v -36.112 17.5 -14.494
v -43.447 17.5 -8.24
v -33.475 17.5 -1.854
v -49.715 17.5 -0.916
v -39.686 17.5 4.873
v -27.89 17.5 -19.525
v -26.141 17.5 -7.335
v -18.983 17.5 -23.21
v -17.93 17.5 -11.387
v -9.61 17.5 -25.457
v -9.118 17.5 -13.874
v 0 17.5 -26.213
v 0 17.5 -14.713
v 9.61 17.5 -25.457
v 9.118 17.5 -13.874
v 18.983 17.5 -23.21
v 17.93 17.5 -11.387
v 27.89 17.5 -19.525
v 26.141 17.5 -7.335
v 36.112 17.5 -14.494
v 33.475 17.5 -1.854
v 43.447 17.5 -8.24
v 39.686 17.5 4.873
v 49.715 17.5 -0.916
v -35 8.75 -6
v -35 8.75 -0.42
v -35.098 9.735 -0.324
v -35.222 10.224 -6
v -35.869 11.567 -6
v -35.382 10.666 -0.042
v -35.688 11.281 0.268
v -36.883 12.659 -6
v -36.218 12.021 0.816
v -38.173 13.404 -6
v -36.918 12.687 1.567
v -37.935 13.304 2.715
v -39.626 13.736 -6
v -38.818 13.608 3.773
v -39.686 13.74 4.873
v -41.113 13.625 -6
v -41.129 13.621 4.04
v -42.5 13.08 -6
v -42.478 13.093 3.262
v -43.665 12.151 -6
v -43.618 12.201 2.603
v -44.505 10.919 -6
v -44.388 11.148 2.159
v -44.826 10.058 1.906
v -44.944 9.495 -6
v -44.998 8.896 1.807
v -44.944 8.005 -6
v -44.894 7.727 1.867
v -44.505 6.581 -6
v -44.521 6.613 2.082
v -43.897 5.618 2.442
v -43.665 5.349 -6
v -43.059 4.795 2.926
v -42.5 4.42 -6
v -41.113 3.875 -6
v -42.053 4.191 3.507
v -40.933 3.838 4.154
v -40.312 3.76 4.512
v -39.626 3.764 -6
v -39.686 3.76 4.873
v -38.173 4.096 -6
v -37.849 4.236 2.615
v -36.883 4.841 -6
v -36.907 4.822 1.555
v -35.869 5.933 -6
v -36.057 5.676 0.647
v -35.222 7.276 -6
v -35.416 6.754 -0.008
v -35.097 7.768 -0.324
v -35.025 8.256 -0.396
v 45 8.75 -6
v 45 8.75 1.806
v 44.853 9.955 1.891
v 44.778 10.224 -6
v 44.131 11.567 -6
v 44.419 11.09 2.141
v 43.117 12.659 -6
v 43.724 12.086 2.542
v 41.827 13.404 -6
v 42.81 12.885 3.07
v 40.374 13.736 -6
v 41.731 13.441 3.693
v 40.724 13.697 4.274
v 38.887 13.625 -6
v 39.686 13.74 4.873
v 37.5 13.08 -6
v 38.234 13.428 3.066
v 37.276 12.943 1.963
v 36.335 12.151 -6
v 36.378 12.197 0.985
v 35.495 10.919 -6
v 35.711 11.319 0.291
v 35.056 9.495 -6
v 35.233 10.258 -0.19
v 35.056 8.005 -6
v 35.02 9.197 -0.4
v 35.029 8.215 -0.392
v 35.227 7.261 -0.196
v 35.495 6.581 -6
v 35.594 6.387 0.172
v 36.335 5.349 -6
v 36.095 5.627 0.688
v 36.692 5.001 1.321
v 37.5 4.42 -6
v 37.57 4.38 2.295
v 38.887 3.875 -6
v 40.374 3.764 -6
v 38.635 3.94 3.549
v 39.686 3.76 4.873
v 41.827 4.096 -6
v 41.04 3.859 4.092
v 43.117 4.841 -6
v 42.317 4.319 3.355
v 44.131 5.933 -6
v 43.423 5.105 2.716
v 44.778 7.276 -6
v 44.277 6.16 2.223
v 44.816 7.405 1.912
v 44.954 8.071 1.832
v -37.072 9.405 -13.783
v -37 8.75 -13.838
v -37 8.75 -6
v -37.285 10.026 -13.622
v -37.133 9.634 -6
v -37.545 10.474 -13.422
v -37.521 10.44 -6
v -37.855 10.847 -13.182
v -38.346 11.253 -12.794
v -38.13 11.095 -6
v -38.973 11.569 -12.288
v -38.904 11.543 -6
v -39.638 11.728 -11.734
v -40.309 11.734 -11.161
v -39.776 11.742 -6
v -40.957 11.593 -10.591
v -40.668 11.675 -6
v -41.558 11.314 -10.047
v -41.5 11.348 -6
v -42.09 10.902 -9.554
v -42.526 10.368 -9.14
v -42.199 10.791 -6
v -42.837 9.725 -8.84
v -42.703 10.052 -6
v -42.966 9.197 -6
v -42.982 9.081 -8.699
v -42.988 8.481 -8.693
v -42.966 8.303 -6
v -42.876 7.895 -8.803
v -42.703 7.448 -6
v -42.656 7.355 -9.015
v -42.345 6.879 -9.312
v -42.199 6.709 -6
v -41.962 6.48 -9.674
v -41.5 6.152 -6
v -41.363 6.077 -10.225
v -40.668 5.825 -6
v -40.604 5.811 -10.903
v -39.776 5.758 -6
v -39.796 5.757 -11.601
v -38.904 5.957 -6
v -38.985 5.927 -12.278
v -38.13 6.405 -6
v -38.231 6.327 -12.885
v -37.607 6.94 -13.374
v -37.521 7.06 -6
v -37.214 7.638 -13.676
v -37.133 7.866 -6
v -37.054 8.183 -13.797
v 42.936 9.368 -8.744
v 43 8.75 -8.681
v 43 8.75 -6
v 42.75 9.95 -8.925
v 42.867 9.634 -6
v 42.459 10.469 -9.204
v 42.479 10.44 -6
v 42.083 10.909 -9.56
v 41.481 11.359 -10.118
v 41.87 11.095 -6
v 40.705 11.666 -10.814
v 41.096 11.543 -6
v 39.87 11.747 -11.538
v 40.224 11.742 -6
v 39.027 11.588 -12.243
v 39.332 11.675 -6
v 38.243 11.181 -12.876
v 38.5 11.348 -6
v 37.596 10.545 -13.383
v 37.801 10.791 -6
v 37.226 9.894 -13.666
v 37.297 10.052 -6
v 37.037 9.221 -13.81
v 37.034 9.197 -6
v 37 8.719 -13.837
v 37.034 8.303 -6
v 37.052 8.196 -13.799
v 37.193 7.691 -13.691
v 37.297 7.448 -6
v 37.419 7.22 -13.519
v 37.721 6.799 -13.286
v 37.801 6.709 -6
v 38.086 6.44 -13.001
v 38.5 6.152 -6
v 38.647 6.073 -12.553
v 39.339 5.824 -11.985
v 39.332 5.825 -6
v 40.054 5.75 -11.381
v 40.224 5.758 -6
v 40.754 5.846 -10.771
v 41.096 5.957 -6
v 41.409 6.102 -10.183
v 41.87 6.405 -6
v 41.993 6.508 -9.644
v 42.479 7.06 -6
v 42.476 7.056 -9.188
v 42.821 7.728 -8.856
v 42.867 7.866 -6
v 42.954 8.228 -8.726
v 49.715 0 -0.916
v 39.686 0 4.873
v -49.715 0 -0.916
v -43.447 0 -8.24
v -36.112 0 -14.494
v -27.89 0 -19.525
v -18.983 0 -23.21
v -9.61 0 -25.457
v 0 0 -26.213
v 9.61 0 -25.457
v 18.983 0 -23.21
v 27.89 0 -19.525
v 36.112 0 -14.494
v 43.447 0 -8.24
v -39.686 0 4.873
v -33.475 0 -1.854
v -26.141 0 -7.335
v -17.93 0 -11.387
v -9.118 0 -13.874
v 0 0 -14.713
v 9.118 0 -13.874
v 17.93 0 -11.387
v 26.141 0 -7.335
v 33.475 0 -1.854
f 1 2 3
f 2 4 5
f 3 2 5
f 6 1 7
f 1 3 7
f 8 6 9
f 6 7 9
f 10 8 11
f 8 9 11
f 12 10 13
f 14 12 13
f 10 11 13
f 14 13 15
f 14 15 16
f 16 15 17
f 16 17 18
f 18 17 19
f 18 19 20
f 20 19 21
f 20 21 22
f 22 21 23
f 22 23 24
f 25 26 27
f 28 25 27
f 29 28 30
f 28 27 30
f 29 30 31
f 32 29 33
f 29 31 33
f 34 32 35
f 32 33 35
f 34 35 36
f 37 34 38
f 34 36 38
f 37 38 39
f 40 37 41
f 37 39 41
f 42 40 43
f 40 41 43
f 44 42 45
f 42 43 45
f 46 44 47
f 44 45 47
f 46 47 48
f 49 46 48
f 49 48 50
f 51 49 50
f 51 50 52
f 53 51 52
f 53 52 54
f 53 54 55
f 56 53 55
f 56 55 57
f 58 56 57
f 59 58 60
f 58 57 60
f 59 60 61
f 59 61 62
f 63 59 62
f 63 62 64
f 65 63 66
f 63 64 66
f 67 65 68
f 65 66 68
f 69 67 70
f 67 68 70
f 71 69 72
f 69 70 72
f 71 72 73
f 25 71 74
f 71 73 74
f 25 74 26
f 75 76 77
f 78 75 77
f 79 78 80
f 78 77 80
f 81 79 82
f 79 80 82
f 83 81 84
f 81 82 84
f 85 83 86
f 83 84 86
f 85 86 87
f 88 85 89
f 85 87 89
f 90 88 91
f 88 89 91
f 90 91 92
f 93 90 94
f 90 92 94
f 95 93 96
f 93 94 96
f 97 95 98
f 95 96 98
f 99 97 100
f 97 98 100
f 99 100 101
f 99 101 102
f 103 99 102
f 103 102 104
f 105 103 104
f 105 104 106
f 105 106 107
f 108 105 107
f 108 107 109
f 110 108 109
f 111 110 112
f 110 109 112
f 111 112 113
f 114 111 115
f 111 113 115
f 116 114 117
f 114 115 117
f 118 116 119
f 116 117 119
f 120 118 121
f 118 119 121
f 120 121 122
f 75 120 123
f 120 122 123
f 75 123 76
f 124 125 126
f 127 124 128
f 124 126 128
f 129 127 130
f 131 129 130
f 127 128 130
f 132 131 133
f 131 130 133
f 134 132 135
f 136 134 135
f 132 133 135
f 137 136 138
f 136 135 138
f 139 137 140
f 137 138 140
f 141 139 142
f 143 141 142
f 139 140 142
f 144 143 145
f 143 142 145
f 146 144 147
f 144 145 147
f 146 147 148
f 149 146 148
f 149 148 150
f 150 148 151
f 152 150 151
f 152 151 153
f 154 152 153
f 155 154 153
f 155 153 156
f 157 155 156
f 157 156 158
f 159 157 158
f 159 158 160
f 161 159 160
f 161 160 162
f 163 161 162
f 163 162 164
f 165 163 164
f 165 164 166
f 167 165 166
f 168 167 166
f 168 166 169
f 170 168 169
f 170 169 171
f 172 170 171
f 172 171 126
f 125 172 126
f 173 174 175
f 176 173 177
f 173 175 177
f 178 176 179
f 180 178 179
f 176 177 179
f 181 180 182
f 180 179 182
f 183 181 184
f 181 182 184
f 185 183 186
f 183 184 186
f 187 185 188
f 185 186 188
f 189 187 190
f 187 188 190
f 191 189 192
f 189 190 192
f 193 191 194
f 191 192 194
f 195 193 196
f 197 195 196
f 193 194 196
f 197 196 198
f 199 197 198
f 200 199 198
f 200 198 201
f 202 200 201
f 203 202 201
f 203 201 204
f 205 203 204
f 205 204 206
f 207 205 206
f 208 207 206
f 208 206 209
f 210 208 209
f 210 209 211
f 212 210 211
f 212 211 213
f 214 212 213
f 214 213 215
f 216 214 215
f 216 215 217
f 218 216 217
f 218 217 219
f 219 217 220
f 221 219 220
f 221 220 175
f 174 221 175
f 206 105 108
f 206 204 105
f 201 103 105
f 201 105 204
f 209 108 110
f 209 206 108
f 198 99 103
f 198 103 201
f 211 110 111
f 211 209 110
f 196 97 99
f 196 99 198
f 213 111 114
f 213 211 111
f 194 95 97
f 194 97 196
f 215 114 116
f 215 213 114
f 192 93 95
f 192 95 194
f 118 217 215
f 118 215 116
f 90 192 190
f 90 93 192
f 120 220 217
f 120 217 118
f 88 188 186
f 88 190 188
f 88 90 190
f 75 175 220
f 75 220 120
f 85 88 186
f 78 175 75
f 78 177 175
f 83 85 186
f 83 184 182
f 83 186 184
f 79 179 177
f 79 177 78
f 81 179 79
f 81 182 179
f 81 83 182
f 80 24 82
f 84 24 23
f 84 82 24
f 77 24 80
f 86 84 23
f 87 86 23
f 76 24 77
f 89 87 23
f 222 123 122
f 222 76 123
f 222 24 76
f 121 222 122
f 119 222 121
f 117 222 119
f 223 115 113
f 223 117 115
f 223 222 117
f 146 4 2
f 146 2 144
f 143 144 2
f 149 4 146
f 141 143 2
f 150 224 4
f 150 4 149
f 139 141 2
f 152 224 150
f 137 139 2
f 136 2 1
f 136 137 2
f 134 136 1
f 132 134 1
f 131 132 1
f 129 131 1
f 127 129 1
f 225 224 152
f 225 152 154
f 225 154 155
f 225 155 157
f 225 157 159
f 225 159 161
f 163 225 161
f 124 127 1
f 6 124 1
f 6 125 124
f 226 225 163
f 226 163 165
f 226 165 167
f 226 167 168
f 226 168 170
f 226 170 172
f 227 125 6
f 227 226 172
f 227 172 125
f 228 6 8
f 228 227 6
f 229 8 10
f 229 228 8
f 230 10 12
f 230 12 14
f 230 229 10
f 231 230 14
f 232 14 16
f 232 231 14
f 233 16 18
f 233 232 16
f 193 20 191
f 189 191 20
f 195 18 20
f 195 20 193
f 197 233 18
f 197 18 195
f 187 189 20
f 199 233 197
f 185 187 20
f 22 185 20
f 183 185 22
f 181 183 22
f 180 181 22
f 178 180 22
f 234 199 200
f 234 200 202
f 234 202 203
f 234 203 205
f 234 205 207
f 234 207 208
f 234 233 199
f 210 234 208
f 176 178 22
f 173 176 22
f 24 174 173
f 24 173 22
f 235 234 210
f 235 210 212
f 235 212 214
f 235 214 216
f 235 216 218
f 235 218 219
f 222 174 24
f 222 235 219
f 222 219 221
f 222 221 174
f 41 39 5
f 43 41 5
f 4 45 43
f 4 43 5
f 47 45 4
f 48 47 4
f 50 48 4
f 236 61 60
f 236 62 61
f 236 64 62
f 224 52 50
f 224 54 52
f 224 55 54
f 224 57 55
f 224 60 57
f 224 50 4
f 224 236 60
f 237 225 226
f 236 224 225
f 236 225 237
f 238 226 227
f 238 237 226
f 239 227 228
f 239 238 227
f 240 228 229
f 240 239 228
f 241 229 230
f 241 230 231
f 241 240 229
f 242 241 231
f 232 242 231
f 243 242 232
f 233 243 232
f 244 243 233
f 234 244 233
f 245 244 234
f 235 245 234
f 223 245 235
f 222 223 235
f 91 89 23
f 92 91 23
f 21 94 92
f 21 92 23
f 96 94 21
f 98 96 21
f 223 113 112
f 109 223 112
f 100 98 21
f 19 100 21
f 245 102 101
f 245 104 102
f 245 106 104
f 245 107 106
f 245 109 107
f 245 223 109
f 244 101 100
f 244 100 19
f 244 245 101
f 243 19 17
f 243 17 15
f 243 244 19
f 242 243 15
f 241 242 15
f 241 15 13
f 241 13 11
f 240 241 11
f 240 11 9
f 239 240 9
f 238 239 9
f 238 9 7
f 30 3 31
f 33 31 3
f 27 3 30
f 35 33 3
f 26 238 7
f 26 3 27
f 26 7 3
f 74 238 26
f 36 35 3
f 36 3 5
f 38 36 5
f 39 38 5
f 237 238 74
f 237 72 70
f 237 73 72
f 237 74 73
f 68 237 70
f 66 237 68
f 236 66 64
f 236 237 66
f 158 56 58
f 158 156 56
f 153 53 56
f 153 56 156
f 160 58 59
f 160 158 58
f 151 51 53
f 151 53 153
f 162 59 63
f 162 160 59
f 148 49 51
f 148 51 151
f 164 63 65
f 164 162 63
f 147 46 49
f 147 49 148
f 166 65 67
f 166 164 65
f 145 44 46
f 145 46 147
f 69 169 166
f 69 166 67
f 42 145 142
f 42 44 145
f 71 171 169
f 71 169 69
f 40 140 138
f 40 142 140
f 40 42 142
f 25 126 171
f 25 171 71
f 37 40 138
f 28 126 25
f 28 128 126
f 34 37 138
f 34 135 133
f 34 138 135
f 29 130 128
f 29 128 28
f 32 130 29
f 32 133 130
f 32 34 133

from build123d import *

# Parameters (mm, degrees)
F1_DEPTH = 17.5
F5_R     = 3
F6_DEPTH = 46.213747
F5_R_2   = 5
F7_DEPTH = 26


with BuildPart() as f1:
    # F0 (on Front) → F1 (new body)
    with BuildSketch(Plane.XZ):
        with BuildLine():
            ThreePointArc((39.686286, 4.873462), (0, -14.712747), (-39.686286, 4.873462))
            Line((-39.686286, 4.873462), (-49.714635, -0.916408))
            ThreePointArc((-49.714635, -0.916408), (0, -26.212747), (49.714635, -0.916408))
            Line((49.714635, -0.916408), (39.686286, 4.873462))
        make_face()
    extrude(amount=-F1_DEPTH)

    # F5 (on offset) → F6 (cut, through all)
    with BuildSketch(Plane.XY.offset(20)):
        with Locations((40, 8.75)):
            Circle(F5_R)
        with Locations((-40, 8.75)):
            Circle(F5_R)
    extrude(amount=-F6_DEPTH, mode=Mode.SUBTRACT)

    # F5 (on offset) → F7 (cut)
    with BuildSketch(Plane.XY.offset(20)):
        with Locations((40, 8.75)):
            Circle(F5_R_2)
        with Locations((40, 8.75)):
            Circle(F5_R, mode=Mode.SUBTRACT)
        with Locations((-40, 8.75)):
            Circle(F5_R_2)
        with Locations((-40, 8.75)):
            Circle(F5_R, mode=Mode.SUBTRACT)
    extrude(amount=-F7_DEPTH, mode=Mode.SUBTRACT)


with BuildPart() as f2_1:
    # F2: copy of F1
    add(f1.part)


solid = f1.part
